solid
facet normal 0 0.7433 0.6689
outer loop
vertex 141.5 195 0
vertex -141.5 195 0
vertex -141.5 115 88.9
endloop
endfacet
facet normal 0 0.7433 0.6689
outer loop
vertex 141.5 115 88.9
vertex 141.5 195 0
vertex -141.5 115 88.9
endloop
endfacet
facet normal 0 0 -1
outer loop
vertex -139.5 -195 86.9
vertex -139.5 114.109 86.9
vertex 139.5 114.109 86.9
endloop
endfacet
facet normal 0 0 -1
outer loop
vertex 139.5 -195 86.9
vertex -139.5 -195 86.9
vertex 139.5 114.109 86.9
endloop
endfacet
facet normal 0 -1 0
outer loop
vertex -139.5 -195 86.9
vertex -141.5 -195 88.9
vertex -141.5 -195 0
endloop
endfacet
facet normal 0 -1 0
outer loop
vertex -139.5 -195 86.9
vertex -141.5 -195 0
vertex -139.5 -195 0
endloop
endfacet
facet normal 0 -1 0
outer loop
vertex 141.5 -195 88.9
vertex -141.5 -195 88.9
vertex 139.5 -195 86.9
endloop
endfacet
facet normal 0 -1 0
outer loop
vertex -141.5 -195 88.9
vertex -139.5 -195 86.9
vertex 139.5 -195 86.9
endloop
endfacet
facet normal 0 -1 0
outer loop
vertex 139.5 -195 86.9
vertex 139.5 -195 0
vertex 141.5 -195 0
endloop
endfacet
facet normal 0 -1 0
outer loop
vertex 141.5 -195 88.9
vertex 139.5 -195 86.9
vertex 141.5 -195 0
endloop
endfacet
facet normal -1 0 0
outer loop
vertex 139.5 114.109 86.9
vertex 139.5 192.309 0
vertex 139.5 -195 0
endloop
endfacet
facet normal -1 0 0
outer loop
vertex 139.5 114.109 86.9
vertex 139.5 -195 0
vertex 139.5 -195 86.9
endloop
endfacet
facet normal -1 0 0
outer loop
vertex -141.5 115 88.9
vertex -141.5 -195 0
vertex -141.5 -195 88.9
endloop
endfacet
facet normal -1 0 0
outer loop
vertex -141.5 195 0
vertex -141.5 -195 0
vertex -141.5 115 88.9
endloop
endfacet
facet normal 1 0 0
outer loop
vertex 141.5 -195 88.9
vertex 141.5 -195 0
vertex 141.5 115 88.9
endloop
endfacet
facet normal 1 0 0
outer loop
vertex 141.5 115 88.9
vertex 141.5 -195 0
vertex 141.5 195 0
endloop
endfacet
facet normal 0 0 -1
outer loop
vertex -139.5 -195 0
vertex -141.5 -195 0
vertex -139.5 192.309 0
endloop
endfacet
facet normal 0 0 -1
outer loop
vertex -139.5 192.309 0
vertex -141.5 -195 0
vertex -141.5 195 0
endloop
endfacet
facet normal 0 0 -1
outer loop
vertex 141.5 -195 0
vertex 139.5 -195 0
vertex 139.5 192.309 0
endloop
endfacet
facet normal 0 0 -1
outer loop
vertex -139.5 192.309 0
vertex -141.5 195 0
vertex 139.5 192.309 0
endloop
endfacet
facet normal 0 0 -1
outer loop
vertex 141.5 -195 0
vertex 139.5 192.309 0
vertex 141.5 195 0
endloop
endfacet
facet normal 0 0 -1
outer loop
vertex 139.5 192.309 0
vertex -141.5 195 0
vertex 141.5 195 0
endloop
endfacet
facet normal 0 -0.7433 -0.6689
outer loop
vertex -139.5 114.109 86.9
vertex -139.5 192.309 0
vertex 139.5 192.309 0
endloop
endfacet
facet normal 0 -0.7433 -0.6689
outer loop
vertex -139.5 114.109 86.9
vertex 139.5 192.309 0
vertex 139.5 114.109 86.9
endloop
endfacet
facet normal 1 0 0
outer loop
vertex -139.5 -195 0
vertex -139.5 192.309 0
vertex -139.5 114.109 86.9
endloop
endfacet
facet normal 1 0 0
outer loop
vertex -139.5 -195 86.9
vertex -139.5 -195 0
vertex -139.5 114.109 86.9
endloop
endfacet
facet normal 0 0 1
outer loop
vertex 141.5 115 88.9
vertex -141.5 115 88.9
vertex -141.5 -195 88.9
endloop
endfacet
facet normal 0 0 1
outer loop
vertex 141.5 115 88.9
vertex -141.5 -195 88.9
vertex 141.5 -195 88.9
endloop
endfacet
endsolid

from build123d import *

# Parameters (mm, degrees)
F0_W     = 283
F0_H     = 390
F1_DEPTH = 88.9
F3_DEPTH = 283.001
F4_W     = 279
F4_H     = 86.9
F5_DEPTH = 390.001
F6_DEPTH = 281


with BuildPart() as f1:
    # F0 (on Top) → F1 (new body)
    with BuildSketch(Plane.XY):
        Rectangle(F0_W, F0_H)
    extrude(amount=F1_DEPTH)

    # F2 (on face) → F3 (cut, through all)
    with BuildSketch(Plane(origin=(-141.5, 0, 0), x_dir=(0, -1, 0), z_dir=(-1, 0, 0))):
        Polygon((-115, 88.9), (-195, 88.9), (-195, 0), align=None)
    extrude(amount=-F3_DEPTH, mode=Mode.SUBTRACT)

    # F4 (on face) → F5 (cut, through all)
    with BuildSketch(Plane.XZ.offset(195)):
        with Locations((0, 43.45)):
            Rectangle(F4_W, F4_H)
    extrude(amount=-F5_DEPTH, mode=Mode.SUBTRACT)

    # F2 (on face) → F6 (join, through all)
    with BuildSketch(Plane(origin=(-141.5, 0, 0), x_dir=(0, -1, 0), z_dir=(-1, 0, 0))):
        Polygon((-112.309426, 88.9), (-115, 88.9), (-195, 0), (-192.309426, 0), align=None)
    extrude(amount=-F6_DEPTH)


solid = f1.part
